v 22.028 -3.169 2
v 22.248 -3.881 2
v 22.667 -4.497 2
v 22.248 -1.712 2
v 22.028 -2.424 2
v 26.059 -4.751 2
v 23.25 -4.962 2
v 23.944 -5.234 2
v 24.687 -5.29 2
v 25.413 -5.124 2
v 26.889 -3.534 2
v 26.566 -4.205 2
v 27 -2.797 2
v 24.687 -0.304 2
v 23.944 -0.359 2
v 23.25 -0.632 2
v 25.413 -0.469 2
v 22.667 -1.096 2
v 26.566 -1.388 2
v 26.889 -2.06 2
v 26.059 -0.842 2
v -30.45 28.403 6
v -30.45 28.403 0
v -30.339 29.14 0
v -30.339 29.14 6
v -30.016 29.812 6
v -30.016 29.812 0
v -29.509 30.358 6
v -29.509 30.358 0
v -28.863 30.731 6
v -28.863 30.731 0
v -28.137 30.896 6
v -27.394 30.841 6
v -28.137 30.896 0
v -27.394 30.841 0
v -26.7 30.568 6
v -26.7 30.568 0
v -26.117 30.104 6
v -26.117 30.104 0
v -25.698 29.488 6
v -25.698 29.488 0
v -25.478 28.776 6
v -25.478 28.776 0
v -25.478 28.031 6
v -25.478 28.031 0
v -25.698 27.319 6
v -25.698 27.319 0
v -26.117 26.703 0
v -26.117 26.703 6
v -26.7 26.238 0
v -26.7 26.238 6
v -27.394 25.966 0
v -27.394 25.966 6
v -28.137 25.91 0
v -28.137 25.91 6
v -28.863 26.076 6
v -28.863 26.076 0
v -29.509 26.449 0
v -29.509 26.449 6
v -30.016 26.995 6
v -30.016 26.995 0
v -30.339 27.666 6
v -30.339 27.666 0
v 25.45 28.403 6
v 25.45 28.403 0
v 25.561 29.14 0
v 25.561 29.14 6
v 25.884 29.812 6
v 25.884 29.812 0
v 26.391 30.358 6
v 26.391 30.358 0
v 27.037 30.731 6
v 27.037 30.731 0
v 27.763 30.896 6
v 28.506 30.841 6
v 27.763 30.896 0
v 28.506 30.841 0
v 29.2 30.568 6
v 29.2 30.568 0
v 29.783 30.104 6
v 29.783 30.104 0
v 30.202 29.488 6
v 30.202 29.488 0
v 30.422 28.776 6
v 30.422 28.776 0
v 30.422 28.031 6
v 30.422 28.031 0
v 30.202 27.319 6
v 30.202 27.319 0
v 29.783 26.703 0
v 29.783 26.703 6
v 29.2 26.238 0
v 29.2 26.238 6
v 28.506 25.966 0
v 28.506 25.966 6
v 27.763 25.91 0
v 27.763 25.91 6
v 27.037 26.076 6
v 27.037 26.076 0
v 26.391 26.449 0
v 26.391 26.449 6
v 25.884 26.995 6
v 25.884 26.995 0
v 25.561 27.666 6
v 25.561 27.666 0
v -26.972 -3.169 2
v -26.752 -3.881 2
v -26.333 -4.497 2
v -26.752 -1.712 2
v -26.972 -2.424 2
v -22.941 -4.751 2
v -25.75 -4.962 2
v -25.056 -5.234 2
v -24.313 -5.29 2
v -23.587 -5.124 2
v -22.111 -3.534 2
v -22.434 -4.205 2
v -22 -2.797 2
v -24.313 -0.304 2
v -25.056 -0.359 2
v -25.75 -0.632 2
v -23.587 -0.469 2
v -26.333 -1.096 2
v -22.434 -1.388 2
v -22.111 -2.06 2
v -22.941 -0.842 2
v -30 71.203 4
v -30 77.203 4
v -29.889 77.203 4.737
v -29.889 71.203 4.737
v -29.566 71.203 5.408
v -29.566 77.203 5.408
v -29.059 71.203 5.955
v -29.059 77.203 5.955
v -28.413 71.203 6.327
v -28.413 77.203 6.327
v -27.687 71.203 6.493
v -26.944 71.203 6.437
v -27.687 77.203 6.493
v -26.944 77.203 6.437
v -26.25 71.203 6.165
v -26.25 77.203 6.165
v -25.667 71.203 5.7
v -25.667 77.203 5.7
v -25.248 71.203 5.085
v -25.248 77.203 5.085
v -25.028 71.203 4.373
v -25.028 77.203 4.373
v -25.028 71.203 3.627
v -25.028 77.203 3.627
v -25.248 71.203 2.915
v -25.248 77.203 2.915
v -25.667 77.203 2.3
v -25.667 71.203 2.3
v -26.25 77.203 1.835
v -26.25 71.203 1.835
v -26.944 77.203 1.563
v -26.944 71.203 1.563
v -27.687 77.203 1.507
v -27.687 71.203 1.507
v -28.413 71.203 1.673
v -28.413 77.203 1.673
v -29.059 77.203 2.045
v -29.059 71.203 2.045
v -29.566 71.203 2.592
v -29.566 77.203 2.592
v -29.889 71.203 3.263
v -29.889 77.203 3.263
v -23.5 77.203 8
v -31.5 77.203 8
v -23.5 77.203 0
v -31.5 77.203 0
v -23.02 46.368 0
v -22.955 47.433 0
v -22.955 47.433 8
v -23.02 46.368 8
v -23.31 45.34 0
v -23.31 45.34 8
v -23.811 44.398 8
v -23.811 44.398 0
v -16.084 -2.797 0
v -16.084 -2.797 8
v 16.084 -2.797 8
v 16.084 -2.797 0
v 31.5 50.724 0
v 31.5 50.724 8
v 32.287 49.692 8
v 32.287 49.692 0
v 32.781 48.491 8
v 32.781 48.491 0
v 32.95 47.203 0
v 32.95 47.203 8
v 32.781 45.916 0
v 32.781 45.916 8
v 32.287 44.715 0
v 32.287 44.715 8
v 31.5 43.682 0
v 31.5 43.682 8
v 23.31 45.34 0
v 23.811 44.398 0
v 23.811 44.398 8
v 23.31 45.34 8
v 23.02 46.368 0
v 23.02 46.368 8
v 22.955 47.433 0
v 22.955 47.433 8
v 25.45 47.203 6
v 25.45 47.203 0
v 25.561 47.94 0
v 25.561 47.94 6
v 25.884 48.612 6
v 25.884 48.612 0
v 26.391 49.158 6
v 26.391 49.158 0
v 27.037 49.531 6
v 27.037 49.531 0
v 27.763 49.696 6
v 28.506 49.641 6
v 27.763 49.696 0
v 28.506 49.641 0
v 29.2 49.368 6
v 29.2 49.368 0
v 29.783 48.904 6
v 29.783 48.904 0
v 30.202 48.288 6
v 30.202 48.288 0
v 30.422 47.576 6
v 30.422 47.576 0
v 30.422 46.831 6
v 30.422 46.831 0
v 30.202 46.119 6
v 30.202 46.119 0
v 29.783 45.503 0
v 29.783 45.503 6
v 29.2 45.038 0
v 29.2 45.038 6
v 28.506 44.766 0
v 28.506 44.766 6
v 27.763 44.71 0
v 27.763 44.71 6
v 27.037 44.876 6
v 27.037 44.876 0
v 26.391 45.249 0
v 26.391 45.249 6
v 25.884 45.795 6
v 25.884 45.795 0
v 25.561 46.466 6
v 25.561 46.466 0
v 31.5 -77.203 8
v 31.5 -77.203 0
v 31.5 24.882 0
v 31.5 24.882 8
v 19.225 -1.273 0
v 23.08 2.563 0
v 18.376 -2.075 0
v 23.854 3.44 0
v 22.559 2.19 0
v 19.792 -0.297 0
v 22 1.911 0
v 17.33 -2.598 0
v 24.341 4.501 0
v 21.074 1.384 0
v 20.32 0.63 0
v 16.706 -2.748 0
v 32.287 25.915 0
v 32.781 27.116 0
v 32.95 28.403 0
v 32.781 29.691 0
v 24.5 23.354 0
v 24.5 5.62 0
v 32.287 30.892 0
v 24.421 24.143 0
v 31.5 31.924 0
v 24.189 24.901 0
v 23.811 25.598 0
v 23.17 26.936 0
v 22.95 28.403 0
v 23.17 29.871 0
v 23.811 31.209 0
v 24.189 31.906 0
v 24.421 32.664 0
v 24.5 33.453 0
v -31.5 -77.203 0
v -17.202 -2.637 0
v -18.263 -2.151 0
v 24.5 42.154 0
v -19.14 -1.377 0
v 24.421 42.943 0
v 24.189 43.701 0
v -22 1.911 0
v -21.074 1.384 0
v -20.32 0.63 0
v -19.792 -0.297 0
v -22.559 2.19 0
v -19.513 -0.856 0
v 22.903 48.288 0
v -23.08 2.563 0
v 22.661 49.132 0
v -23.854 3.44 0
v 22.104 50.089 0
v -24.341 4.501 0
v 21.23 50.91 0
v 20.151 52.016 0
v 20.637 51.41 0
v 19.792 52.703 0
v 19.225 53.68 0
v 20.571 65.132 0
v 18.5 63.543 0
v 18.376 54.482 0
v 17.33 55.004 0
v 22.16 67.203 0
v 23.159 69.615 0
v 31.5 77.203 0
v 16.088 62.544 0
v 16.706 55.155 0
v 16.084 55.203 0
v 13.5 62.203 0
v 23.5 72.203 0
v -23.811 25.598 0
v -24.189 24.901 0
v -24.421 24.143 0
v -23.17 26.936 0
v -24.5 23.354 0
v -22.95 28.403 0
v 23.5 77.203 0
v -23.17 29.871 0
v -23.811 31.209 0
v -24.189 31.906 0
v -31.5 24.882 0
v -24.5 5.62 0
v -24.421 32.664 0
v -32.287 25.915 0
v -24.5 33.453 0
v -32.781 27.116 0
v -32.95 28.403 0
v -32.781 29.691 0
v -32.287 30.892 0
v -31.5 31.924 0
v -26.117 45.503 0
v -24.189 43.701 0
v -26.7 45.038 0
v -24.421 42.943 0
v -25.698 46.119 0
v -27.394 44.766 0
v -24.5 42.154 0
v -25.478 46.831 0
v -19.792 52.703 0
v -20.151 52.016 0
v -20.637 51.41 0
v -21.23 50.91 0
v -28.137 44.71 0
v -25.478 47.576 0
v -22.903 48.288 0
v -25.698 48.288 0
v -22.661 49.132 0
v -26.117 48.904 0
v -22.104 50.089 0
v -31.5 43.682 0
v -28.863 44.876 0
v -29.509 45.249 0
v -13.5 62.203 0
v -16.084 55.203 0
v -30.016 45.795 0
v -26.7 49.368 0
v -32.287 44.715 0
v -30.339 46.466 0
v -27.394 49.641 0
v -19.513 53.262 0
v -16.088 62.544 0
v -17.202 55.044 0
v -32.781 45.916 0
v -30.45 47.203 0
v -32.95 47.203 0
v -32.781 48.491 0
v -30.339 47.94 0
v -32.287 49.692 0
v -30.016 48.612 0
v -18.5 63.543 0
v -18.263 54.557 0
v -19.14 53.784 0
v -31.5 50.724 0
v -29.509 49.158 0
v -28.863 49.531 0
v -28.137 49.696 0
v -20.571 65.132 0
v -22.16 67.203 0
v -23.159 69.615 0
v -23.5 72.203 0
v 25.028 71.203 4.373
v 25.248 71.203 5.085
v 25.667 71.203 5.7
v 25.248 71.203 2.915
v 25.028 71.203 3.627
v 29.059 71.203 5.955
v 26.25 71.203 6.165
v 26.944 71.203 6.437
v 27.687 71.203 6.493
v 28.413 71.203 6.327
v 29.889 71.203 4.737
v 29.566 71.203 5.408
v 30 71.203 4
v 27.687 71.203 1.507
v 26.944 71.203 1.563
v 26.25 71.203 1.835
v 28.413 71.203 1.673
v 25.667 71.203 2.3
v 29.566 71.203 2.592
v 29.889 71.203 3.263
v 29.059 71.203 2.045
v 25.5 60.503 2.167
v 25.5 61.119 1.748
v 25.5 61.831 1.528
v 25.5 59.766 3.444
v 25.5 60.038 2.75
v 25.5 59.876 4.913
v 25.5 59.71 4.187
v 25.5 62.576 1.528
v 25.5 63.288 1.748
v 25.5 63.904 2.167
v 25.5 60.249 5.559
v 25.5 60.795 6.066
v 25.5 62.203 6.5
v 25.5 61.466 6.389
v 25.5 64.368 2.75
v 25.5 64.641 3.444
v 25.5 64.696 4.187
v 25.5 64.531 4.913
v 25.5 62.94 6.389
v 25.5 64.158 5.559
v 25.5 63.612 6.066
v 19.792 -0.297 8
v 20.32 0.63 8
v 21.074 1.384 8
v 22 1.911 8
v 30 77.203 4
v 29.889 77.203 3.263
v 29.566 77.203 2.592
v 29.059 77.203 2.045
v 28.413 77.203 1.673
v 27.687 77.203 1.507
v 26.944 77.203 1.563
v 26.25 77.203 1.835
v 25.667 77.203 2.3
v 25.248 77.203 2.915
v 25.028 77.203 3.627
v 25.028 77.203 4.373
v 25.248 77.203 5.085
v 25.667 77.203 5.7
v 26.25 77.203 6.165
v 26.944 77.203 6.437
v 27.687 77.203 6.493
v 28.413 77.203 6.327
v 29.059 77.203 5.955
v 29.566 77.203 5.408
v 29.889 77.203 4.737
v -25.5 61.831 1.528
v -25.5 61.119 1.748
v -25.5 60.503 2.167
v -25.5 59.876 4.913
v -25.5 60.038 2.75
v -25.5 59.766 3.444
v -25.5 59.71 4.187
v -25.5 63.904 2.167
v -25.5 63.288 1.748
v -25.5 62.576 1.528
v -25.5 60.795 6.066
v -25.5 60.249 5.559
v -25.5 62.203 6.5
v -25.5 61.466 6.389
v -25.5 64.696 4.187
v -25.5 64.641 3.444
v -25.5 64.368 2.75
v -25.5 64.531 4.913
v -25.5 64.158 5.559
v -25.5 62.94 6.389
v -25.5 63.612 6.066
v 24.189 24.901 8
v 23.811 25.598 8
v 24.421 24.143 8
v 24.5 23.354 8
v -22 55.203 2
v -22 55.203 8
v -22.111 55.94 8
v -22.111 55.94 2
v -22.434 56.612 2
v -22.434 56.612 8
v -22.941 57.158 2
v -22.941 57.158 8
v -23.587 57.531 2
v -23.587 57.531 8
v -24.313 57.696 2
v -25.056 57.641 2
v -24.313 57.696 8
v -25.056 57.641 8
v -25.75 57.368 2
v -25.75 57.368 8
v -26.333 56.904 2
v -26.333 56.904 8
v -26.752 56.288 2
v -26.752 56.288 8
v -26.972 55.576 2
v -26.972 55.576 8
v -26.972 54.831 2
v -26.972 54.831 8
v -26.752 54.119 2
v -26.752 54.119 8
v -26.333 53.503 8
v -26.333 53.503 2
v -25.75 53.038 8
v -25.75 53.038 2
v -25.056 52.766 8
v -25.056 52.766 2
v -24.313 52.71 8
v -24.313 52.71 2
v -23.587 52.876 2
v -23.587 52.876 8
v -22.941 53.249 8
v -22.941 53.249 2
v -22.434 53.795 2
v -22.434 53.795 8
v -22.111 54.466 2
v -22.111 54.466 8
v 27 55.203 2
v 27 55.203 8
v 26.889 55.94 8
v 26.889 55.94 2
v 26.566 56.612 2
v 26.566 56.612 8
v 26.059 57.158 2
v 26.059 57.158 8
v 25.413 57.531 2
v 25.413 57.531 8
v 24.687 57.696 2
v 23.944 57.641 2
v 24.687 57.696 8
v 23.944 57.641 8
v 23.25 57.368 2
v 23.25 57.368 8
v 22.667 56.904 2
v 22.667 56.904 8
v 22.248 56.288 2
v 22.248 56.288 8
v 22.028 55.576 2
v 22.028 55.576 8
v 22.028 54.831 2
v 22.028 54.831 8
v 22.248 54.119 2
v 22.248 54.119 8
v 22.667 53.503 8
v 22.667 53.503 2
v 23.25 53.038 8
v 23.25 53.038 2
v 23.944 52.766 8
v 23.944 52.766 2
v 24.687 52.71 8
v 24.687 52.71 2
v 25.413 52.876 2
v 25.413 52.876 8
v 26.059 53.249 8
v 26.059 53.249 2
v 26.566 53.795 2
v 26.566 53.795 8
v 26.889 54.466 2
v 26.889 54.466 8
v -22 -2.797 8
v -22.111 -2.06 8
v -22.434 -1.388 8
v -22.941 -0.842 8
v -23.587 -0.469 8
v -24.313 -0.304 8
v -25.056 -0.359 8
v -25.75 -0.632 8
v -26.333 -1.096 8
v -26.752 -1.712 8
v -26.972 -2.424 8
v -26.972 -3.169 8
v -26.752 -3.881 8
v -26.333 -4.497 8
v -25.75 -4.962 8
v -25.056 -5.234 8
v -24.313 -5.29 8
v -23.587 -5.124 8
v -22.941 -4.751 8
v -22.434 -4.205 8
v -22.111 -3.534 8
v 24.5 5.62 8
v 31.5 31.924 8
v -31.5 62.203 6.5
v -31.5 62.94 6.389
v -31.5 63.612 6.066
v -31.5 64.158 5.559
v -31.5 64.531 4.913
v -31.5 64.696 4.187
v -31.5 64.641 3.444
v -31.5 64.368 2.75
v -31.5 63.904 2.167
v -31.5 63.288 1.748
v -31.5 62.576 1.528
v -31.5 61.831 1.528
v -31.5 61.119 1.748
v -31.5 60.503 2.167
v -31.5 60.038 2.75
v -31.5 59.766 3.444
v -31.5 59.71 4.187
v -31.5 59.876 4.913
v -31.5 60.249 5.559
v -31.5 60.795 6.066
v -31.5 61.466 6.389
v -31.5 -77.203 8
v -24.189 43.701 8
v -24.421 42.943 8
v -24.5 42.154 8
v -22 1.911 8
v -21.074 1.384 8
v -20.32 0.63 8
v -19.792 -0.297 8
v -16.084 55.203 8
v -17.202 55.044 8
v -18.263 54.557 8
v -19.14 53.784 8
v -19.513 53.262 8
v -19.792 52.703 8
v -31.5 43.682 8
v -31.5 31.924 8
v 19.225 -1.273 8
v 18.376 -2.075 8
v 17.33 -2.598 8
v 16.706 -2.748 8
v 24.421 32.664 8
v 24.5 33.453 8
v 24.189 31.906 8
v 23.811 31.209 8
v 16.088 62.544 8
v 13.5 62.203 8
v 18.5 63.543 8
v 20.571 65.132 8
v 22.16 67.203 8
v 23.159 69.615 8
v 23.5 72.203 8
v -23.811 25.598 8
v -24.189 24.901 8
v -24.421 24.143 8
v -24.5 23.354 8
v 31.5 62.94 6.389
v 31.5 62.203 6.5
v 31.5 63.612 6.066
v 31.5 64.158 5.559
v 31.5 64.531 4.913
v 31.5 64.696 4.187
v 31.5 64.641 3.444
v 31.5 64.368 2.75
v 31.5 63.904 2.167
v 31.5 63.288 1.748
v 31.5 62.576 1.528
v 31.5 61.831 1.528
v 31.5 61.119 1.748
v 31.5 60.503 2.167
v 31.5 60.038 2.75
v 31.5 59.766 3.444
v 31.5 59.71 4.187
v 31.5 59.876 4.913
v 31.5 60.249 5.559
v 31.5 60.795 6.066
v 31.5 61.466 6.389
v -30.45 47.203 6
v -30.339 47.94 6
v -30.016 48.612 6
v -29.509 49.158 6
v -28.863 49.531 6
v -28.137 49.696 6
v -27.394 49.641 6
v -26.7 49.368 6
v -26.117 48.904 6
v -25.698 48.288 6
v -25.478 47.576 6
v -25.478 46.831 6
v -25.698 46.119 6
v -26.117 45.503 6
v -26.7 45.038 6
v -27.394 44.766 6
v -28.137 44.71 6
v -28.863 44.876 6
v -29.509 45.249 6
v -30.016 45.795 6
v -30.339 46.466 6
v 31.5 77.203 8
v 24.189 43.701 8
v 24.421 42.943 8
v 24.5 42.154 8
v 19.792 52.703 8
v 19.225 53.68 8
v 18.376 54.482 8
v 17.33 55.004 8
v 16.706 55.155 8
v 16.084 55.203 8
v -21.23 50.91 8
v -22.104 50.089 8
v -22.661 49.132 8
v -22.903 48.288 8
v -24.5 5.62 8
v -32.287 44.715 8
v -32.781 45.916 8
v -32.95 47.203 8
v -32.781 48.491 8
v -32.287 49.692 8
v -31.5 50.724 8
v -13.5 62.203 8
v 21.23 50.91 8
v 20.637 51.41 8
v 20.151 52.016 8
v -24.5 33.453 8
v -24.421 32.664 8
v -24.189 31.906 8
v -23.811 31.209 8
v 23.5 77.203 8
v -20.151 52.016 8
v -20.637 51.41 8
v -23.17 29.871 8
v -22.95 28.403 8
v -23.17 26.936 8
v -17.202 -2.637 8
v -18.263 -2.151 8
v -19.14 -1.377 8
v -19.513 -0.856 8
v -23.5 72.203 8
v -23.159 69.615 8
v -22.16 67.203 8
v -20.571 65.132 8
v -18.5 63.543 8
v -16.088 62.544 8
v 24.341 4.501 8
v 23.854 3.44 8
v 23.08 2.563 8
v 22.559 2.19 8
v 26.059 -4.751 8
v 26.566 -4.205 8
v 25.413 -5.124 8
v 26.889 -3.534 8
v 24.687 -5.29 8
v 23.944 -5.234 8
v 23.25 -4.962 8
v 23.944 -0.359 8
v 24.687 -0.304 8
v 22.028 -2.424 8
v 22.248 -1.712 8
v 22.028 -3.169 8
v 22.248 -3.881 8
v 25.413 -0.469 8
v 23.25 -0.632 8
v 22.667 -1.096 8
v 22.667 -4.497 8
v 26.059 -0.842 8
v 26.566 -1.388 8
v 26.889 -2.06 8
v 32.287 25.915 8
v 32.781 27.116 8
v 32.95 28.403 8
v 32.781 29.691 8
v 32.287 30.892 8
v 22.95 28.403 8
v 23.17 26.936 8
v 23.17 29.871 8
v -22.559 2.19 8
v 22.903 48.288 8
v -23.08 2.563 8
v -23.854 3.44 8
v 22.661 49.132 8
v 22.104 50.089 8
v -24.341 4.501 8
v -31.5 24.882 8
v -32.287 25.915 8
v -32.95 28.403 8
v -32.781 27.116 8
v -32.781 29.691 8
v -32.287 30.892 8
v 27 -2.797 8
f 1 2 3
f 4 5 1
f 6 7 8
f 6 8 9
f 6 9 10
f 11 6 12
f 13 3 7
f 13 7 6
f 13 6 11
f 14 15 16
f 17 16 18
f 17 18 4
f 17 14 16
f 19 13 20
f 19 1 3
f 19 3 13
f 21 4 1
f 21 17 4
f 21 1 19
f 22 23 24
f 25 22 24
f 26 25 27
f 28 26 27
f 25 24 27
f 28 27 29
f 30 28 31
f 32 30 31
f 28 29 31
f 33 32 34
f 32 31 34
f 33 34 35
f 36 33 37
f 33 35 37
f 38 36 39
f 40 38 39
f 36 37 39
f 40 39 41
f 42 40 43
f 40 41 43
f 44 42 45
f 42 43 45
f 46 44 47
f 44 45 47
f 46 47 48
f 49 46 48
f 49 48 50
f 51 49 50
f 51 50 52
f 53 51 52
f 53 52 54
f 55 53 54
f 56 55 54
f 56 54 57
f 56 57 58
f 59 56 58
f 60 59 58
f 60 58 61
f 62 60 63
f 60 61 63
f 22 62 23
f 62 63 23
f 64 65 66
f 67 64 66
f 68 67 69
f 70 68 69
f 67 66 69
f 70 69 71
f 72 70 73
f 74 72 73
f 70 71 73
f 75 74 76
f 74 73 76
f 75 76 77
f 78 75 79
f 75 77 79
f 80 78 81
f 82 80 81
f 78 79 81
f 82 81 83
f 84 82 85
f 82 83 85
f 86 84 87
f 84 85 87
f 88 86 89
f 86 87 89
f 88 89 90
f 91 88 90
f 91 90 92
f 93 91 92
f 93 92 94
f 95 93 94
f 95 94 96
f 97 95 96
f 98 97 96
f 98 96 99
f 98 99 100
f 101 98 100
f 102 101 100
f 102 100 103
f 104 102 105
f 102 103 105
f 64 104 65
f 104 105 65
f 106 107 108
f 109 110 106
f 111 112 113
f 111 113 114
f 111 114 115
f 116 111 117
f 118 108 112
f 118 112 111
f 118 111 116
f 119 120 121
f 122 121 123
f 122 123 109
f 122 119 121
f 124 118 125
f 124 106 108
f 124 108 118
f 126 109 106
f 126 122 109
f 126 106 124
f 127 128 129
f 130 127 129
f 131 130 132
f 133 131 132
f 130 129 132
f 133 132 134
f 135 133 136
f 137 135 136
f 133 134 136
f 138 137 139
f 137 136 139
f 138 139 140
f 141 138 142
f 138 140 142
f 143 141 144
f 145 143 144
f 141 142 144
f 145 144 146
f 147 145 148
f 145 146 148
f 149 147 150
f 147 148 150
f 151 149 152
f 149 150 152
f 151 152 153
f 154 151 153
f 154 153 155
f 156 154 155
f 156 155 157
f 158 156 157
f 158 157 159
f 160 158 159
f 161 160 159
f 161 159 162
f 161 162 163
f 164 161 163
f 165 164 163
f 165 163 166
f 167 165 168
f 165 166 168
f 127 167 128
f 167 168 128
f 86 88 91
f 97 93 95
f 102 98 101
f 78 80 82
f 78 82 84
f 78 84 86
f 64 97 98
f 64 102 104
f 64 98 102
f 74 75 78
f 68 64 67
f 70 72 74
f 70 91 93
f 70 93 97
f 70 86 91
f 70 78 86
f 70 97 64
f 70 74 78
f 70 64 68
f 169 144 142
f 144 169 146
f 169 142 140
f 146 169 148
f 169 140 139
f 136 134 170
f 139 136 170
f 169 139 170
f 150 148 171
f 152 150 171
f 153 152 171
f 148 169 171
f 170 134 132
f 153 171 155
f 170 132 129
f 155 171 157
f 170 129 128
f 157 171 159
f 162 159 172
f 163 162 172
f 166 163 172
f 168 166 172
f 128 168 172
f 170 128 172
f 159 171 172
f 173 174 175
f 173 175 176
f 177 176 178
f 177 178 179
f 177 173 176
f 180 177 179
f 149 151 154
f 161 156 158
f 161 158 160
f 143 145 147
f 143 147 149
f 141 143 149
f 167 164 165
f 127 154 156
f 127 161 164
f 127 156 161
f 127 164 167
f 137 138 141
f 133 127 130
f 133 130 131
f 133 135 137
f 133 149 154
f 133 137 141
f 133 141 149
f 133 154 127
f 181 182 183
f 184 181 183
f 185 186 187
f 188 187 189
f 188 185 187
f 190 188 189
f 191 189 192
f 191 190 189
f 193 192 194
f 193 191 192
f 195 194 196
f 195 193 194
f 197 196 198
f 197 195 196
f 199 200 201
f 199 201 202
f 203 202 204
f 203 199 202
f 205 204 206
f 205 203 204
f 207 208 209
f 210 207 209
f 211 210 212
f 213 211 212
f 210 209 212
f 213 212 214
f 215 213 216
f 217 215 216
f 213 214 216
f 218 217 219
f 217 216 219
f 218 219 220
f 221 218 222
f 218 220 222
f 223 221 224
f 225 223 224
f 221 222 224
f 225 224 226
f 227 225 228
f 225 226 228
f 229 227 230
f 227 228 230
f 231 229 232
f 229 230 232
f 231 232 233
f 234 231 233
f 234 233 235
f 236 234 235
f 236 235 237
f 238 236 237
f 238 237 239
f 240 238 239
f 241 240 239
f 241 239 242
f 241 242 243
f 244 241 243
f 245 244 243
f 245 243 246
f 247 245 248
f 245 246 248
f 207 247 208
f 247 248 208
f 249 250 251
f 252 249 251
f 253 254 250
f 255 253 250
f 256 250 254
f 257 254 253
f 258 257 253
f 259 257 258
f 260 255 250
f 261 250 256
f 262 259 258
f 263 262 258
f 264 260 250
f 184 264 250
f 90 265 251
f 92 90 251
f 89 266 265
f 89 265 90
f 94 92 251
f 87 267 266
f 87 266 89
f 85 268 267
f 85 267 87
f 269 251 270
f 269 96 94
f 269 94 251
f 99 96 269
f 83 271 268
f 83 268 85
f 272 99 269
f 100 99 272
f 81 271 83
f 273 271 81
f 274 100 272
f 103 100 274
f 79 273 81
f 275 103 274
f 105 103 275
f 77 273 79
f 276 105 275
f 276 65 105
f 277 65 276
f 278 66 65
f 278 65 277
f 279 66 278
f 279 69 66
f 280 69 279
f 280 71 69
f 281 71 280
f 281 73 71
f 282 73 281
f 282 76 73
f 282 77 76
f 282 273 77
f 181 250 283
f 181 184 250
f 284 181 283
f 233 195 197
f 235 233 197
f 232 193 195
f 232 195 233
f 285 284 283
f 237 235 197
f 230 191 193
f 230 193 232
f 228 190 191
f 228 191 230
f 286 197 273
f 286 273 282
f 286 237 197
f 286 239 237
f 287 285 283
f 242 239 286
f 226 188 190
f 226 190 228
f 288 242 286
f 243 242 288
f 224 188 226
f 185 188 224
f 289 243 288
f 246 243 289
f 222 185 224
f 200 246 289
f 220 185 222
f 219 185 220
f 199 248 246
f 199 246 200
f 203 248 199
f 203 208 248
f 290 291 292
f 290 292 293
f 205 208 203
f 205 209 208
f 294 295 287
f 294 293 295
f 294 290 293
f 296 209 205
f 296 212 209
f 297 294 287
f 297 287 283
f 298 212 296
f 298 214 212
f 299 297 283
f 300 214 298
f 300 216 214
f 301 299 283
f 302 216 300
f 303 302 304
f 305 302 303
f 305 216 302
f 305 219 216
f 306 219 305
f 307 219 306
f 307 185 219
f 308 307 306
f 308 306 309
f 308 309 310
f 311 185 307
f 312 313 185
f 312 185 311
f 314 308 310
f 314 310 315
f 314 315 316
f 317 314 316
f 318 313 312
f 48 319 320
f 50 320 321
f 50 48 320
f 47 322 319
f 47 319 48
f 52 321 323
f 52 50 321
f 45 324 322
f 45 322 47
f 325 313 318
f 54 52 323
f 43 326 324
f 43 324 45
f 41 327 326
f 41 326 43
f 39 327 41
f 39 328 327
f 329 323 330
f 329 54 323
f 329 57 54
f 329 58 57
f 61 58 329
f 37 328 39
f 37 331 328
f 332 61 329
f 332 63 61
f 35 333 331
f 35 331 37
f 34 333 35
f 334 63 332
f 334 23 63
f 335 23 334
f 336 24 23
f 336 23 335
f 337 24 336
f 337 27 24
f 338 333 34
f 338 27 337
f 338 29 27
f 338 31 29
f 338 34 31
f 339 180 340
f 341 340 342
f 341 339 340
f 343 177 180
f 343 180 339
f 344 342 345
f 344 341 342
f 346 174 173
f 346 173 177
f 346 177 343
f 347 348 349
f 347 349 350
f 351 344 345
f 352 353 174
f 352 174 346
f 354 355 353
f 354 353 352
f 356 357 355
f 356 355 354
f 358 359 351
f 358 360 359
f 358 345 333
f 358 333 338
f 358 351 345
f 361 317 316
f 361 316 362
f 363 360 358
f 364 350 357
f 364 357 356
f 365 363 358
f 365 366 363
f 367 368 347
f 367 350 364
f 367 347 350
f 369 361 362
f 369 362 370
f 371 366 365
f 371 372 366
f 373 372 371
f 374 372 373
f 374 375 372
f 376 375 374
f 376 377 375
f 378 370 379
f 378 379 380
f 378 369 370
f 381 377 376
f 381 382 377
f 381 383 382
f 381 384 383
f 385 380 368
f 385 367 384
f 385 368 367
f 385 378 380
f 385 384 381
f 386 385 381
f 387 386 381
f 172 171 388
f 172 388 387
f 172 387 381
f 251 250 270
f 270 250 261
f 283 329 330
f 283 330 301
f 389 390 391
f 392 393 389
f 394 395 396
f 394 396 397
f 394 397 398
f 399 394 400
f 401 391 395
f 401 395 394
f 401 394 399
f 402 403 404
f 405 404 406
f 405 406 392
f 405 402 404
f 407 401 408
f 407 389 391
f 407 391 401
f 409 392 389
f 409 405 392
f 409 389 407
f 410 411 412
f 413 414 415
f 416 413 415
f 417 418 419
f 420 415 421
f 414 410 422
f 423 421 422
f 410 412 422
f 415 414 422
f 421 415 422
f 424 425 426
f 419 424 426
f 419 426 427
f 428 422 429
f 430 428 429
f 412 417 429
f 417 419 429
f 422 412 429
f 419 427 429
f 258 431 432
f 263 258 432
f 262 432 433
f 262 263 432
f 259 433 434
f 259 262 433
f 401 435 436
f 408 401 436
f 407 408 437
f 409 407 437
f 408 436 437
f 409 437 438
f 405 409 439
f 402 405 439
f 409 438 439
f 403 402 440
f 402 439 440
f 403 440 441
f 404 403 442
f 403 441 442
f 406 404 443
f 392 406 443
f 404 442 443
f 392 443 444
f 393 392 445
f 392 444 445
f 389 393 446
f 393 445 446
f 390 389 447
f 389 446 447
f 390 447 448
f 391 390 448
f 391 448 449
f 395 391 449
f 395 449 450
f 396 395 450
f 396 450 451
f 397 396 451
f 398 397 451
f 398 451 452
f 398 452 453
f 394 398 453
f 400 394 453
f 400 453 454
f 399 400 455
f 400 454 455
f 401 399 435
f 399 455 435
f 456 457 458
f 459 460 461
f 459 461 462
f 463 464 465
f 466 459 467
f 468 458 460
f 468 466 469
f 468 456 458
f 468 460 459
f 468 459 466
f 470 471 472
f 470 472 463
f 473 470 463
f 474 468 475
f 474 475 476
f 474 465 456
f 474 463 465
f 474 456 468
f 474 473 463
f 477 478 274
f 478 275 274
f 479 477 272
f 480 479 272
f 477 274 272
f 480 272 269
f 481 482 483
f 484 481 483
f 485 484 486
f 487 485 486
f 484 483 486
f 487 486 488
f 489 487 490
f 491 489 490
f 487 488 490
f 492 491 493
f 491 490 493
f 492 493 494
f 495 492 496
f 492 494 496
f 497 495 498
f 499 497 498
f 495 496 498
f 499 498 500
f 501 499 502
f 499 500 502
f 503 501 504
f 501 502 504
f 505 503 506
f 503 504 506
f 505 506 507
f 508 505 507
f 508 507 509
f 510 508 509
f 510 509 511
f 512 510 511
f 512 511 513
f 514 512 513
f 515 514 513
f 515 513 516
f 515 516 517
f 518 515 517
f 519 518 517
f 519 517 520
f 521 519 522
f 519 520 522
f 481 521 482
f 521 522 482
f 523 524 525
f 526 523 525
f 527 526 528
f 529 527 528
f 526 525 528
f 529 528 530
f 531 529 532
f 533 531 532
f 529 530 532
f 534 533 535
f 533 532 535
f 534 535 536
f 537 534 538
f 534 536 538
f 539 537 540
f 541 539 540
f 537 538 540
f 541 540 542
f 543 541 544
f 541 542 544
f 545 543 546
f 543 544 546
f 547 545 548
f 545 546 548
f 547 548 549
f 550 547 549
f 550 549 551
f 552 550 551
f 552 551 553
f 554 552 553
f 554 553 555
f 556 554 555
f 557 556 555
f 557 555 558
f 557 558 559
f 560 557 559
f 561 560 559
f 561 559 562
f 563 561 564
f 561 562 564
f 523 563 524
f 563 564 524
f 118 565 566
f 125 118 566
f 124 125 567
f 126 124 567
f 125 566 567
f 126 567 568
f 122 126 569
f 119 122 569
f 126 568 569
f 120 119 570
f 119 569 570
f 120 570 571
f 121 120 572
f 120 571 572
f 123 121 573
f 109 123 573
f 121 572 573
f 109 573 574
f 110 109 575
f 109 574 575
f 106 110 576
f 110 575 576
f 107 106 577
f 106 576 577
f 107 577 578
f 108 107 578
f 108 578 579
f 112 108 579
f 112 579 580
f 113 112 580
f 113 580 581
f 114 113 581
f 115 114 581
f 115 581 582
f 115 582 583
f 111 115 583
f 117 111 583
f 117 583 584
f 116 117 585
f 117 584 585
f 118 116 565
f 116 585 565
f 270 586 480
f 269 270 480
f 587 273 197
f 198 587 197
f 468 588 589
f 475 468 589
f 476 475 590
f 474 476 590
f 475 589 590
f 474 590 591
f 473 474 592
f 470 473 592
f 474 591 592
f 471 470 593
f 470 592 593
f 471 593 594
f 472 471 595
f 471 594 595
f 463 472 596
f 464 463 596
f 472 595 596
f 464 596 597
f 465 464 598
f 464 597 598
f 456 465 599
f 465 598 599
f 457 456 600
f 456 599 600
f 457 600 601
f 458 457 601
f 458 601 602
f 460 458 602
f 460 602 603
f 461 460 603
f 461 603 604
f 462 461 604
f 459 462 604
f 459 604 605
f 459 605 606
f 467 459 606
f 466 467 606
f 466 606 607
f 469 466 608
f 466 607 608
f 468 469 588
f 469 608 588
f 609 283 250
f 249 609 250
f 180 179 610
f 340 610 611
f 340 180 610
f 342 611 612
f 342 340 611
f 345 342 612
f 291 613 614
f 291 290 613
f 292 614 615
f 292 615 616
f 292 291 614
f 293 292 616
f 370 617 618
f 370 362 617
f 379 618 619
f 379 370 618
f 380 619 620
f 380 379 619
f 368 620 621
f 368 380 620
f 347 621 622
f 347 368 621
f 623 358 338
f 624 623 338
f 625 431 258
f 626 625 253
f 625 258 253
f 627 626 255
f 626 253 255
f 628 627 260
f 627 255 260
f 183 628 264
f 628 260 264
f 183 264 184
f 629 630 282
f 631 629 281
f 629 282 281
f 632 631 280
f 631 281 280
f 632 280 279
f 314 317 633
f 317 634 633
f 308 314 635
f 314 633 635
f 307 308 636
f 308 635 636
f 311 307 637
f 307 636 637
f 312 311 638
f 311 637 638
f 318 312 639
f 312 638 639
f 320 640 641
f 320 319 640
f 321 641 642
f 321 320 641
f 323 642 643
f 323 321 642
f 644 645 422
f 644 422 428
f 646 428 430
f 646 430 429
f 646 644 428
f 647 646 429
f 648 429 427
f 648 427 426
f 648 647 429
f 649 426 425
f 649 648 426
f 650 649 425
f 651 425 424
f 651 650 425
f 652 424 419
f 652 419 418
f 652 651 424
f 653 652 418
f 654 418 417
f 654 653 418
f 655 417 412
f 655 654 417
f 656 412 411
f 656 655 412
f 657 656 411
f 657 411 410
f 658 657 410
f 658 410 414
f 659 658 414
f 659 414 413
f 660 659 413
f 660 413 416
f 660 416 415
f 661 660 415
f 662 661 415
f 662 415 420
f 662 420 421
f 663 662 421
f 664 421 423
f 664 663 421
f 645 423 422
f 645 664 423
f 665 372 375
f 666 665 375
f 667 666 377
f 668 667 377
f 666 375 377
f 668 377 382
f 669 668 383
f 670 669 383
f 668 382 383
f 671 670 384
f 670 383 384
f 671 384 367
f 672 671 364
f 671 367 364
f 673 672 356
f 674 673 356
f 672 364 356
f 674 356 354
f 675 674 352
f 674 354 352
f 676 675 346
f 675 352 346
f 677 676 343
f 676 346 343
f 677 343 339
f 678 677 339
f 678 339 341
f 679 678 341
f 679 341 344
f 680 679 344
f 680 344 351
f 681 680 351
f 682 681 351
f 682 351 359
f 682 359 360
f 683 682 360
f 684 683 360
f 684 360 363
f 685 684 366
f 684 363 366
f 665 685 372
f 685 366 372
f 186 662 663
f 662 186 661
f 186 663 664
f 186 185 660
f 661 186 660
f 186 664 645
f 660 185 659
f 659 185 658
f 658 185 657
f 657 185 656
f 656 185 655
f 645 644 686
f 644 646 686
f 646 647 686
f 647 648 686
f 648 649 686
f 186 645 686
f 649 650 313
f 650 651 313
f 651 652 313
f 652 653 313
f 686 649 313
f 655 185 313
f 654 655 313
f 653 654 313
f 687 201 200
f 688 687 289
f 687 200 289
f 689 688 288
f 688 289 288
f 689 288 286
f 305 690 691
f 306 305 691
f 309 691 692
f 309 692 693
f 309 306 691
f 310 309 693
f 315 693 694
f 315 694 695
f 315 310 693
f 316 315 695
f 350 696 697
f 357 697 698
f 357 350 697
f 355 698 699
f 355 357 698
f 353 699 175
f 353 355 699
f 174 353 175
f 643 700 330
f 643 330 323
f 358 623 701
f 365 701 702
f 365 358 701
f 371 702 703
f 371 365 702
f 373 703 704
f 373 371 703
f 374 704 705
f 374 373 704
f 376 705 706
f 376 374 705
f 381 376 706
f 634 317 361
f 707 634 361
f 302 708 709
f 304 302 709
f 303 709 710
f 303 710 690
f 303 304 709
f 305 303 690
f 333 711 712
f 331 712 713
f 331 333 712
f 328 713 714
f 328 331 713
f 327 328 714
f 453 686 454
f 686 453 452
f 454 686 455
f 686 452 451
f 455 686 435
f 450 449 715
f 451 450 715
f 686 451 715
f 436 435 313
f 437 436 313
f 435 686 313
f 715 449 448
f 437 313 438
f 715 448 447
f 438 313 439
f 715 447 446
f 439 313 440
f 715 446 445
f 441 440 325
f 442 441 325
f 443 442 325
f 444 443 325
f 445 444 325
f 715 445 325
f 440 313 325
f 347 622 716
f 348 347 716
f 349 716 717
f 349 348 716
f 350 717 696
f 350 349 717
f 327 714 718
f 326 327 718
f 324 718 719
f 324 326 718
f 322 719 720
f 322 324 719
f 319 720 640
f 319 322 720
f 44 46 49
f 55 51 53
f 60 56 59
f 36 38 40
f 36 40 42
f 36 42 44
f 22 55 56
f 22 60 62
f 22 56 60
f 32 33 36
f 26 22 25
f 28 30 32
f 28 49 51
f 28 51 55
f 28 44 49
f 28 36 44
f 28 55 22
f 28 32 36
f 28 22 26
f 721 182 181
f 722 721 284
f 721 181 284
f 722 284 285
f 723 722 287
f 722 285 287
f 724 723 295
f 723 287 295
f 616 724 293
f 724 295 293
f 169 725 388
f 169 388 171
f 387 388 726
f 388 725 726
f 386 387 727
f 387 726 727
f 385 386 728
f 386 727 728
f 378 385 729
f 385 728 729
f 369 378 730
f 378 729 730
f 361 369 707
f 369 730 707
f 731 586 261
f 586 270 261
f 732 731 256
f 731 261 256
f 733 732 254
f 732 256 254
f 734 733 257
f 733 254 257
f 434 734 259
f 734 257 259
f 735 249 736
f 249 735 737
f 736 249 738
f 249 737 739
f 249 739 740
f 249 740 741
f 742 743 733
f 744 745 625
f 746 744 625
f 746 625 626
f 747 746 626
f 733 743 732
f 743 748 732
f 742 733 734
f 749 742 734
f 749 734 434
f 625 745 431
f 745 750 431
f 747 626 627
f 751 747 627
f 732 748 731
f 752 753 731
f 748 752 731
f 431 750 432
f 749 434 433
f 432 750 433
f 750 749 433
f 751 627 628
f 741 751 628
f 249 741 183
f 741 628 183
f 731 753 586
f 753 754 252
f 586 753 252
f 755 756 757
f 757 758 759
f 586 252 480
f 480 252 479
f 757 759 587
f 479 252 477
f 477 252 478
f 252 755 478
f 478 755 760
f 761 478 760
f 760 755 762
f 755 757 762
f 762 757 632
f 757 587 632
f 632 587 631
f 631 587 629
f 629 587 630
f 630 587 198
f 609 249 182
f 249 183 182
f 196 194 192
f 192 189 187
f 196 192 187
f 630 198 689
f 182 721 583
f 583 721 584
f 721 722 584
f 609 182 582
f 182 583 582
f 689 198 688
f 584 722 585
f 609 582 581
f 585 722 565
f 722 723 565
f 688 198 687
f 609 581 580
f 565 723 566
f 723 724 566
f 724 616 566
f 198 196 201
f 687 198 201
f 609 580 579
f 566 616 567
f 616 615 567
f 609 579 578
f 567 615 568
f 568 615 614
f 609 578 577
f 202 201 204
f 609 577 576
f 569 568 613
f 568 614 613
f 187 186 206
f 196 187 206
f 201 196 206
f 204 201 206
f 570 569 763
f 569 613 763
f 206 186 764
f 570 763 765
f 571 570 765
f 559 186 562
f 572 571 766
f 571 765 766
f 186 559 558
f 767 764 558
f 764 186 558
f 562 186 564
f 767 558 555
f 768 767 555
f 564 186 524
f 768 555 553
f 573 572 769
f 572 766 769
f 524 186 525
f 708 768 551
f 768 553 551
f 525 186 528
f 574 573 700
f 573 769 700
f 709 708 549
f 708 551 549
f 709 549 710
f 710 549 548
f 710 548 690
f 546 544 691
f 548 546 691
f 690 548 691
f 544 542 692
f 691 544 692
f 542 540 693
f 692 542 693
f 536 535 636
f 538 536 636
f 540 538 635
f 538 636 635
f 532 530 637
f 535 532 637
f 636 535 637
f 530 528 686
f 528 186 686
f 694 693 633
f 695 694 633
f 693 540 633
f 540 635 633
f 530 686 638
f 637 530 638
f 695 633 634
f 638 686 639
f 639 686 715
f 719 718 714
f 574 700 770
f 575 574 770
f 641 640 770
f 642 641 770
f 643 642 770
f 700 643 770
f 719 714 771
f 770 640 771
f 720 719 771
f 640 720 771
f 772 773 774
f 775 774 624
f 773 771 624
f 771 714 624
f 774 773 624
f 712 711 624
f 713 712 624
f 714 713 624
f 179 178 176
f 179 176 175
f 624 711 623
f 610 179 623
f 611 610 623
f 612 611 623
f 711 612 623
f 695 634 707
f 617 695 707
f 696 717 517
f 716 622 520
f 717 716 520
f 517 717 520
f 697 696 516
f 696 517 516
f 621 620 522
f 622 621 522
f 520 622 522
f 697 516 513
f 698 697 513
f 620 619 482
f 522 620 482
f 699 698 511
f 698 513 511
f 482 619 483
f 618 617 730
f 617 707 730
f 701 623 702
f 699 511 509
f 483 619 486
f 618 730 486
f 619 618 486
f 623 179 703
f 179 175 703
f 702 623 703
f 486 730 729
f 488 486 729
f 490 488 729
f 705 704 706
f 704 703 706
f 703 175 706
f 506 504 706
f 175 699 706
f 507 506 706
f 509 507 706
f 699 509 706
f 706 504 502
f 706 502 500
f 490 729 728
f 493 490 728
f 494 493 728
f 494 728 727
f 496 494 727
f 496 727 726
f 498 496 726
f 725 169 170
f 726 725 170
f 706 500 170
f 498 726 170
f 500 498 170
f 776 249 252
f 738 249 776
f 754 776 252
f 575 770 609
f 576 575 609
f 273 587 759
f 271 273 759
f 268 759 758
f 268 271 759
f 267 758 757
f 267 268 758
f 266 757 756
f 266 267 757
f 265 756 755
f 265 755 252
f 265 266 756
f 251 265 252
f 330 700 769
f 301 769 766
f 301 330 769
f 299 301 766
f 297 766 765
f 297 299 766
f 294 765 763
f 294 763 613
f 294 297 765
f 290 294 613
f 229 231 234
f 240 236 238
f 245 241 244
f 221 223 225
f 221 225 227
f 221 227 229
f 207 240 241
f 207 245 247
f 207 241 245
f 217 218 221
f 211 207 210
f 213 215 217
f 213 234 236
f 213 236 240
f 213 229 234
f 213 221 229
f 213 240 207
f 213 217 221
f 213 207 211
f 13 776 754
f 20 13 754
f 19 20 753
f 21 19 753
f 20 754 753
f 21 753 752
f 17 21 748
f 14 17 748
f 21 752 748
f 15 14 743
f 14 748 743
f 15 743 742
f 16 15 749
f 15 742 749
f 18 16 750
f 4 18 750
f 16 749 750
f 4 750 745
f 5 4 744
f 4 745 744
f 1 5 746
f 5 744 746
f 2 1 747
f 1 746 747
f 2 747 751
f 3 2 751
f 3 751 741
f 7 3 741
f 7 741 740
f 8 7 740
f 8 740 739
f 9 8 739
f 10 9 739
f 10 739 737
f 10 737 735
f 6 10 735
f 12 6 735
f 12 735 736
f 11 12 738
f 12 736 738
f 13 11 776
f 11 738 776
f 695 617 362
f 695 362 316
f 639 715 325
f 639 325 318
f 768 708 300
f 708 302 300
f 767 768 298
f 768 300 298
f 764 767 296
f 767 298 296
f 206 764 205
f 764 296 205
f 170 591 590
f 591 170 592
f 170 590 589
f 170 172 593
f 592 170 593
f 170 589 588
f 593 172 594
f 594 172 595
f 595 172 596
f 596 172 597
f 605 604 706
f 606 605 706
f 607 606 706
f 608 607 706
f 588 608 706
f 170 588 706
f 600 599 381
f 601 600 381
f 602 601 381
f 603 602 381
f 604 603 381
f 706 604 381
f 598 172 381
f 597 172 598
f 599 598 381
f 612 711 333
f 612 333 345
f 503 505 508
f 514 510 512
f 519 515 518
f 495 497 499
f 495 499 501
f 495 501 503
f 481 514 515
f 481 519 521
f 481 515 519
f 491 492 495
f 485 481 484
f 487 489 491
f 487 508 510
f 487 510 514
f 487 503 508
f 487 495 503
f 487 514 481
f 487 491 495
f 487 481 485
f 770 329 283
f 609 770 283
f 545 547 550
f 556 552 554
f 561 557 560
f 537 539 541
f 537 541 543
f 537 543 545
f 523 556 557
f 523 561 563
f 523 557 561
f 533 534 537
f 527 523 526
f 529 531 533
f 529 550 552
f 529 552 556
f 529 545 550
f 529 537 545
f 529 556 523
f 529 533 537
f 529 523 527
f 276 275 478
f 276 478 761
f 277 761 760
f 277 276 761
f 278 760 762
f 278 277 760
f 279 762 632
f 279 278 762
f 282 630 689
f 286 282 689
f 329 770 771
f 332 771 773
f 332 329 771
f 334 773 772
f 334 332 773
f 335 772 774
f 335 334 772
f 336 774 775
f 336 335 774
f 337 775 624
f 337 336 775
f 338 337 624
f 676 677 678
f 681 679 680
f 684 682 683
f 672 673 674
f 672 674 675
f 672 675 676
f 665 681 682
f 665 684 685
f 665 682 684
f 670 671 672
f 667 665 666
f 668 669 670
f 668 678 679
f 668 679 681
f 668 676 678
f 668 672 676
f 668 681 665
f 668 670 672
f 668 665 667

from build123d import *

# Parameters (mm, degrees)
EXTRUDE_1_DEPTH     = 8
SKETCH_2_R          = 2.5
CUT_EXTRUDE_1_DEPTH = 6
SKETCH_3_R          = 2.5
CUT_EXTRUDE_2_DEPTH = 6
FILLET_1_R          = 10
SKETCH_4_W          = 39
SKETCH_4_H          = 48
SKETCH_4_W_2        = 5
SKETCH_4_H_2        = 5
CUT_EXTRUDE_3_DEPTH = 21
SKETCH_5_R          = 5
EXTRUDE_2_DEPTH     = 8
FILLET_2_R          = 4
FILLET_3_R          = 4
SKETCH_6_R          = 2.5
CUT_EXTRUDE_4_DEPTH = 6
SKETCH_7_R          = 2.5
CUT_EXTRUDE_5_DEPTH = 6


with BuildPart() as part:
    # Эскиз1 → Бобышка-Вытянуть1 (new body)
    with BuildSketch(Plane.XY):
        Polygon((-23.5, 62.203361065), (-23.5, 77.203361065), (-31.5, 77.203361065), (-31.5, -77.203361065), (31.5, -77.203361065), (31.5, 77.203361065), (23.5, 77.203361065), (23.5, 62.203361065), align=None)
    extrude(amount=EXTRUDE_1_DEPTH)

    # Эскиз2 → Вырез-Вытянуть1 (cut)
    with BuildSketch(Plane(origin=(0, 77.203361065, 0), x_dir=(1, 0, 0), z_dir=(0, 1, 0))):
        with Locations(Location((-27.5, -4, 0), (0, 0, 180))):
            Circle(SKETCH_2_R)
        with Locations((27.5, -4)):
            Circle(SKETCH_2_R)
    extrude(amount=-CUT_EXTRUDE_1_DEPTH, mode=Mode.SUBTRACT)

    # Эскиз3 → Вырез-Вытянуть2 (cut)
    with BuildSketch(Plane.XY.offset(8)):
        with Locations((-24.5, 55.203361065)):
            Circle(SKETCH_3_R)
        with Locations((24.5, 55.203361065)):
            Circle(SKETCH_3_R)
        with Locations((24.5, -2.796638935)):
            Circle(SKETCH_3_R)
        with Locations((-24.5, -2.796638935)):
            Circle(SKETCH_3_R)
    extrude(amount=-CUT_EXTRUDE_2_DEPTH, mode=Mode.SUBTRACT)

    # Скругление1
    fillet_1_edges = [part.edges().sort_by_distance(p)[0] for p in [
        (-23.5, 62.203361065, 4),
        (23.5, 62.203361065, 4),
    ]]
    fillet(fillet_1_edges, radius=FILLET_1_R)

    # Эскиз4 → Вырез-Вытянуть3 (cut)
    with BuildSketch(Plane.XY.offset(8)):
        with Locations((0, 26.203361065)):
            Rectangle(SKETCH_4_W, SKETCH_4_H)
        with Locations((-22, 26.203361065)):
            Rectangle(SKETCH_4_W_2, SKETCH_4_H)
        with Locations((0, 52.703361065)):
            Rectangle(SKETCH_4_W, SKETCH_4_H_2)
        with Locations((22, 26.203361065)):
            Rectangle(SKETCH_4_W_2, SKETCH_4_H)
        with Locations((0, -0.296638935)):
            Rectangle(SKETCH_4_W, SKETCH_4_H_2)
    extrude(amount=-CUT_EXTRUDE_3_DEPTH, mode=Mode.SUBTRACT)

    # Эскиз5 → Бобышка-Вытянуть2 (add)
    with BuildSketch(Plane(origin=(0, 0, 0), x_dir=(-1, 0, 0), z_dir=(0, 0, -1))):
        with Locations((-27.95, 47.203361065)):
            Circle(SKETCH_5_R)
        with Locations((-27.95, 28.403361065)):
            Circle(SKETCH_5_R)
        with Locations((27.95, 28.403361065)):
            Circle(SKETCH_5_R)
        with Locations((27.95, 47.203361065)):
            Circle(SKETCH_5_R)
    extrude(amount=-EXTRUDE_2_DEPTH)

    # Скругление2
    fillet_2_edges = [part.edges().sort_by_distance(p)[0] for p in [
        (-19.5, 2.203361065, 4),
        (-19.5, 50.203361065, 4),
        (19.5, 50.203361065, 4),
        (19.5, 2.203361065, 4),
    ]]
    fillet(fillet_2_edges, radius=FILLET_2_R)

    # Скругление3
    fillet_3_edges = [part.edges().sort_by_distance(p)[0] for p in [
        (-24.5, 32.0224079, 4),
        (-24.5, 24.784314229, 4),
        (-24.5, 43.584314229, 4),
        (-23.95, 50.203361065, 4),
        (-19.5, 55.203361065, 4),
        (24.5, 32.0224079, 4),
        (24.5, 24.784314229, 4),
        (24.5, 43.584314229, 4),
        (19.5, 55.203361065, 4),
        (23.95, 50.203361065, 4),
        (24.5, 2.203361065, 4),
        (19.5, -2.796638935, 4),
        (-19.5, -2.796638935, 4),
        (-24.5, 2.203361065, 4),
    ]]
    fillet(fillet_3_edges, radius=FILLET_3_R)

    # Эскиз6 → Вырез-Вытянуть4 (cut)
    with BuildSketch(Plane(origin=(0, 0, 0), x_dir=(-1, 0, 0), z_dir=(0, 0, -1))):
        with Locations((-27.95, 47.203361065)):
            Circle(SKETCH_6_R)
        with Locations((27.95, 47.203361065)):
            Circle(SKETCH_6_R)
        with Locations((27.95, 28.403361065)):
            Circle(SKETCH_6_R)
        with Locations((-27.95, 28.403361065)):
            Circle(SKETCH_6_R)
    extrude(amount=-CUT_EXTRUDE_4_DEPTH, mode=Mode.SUBTRACT)

    # Эскиз7 → Вырез-Вытянуть5 (cut)
    with BuildSketch(Plane.ZY.offset(31.5)):
        with Locations((4, 62.203361065)):
            Circle(SKETCH_7_R)
    cut_extrude_5 = extrude(amount=-CUT_EXTRUDE_5_DEPTH, mode=Mode.SUBTRACT)

    # Зеркальное отражение1: Вырез-Вытянуть5 across plane
    add(cut_extrude_5.mirror(Plane(origin=(0, 0, 0), x_dir=(0, 0, 1), z_dir=(1, 0, 0))), mode=Mode.SUBTRACT)


solid = part.part
